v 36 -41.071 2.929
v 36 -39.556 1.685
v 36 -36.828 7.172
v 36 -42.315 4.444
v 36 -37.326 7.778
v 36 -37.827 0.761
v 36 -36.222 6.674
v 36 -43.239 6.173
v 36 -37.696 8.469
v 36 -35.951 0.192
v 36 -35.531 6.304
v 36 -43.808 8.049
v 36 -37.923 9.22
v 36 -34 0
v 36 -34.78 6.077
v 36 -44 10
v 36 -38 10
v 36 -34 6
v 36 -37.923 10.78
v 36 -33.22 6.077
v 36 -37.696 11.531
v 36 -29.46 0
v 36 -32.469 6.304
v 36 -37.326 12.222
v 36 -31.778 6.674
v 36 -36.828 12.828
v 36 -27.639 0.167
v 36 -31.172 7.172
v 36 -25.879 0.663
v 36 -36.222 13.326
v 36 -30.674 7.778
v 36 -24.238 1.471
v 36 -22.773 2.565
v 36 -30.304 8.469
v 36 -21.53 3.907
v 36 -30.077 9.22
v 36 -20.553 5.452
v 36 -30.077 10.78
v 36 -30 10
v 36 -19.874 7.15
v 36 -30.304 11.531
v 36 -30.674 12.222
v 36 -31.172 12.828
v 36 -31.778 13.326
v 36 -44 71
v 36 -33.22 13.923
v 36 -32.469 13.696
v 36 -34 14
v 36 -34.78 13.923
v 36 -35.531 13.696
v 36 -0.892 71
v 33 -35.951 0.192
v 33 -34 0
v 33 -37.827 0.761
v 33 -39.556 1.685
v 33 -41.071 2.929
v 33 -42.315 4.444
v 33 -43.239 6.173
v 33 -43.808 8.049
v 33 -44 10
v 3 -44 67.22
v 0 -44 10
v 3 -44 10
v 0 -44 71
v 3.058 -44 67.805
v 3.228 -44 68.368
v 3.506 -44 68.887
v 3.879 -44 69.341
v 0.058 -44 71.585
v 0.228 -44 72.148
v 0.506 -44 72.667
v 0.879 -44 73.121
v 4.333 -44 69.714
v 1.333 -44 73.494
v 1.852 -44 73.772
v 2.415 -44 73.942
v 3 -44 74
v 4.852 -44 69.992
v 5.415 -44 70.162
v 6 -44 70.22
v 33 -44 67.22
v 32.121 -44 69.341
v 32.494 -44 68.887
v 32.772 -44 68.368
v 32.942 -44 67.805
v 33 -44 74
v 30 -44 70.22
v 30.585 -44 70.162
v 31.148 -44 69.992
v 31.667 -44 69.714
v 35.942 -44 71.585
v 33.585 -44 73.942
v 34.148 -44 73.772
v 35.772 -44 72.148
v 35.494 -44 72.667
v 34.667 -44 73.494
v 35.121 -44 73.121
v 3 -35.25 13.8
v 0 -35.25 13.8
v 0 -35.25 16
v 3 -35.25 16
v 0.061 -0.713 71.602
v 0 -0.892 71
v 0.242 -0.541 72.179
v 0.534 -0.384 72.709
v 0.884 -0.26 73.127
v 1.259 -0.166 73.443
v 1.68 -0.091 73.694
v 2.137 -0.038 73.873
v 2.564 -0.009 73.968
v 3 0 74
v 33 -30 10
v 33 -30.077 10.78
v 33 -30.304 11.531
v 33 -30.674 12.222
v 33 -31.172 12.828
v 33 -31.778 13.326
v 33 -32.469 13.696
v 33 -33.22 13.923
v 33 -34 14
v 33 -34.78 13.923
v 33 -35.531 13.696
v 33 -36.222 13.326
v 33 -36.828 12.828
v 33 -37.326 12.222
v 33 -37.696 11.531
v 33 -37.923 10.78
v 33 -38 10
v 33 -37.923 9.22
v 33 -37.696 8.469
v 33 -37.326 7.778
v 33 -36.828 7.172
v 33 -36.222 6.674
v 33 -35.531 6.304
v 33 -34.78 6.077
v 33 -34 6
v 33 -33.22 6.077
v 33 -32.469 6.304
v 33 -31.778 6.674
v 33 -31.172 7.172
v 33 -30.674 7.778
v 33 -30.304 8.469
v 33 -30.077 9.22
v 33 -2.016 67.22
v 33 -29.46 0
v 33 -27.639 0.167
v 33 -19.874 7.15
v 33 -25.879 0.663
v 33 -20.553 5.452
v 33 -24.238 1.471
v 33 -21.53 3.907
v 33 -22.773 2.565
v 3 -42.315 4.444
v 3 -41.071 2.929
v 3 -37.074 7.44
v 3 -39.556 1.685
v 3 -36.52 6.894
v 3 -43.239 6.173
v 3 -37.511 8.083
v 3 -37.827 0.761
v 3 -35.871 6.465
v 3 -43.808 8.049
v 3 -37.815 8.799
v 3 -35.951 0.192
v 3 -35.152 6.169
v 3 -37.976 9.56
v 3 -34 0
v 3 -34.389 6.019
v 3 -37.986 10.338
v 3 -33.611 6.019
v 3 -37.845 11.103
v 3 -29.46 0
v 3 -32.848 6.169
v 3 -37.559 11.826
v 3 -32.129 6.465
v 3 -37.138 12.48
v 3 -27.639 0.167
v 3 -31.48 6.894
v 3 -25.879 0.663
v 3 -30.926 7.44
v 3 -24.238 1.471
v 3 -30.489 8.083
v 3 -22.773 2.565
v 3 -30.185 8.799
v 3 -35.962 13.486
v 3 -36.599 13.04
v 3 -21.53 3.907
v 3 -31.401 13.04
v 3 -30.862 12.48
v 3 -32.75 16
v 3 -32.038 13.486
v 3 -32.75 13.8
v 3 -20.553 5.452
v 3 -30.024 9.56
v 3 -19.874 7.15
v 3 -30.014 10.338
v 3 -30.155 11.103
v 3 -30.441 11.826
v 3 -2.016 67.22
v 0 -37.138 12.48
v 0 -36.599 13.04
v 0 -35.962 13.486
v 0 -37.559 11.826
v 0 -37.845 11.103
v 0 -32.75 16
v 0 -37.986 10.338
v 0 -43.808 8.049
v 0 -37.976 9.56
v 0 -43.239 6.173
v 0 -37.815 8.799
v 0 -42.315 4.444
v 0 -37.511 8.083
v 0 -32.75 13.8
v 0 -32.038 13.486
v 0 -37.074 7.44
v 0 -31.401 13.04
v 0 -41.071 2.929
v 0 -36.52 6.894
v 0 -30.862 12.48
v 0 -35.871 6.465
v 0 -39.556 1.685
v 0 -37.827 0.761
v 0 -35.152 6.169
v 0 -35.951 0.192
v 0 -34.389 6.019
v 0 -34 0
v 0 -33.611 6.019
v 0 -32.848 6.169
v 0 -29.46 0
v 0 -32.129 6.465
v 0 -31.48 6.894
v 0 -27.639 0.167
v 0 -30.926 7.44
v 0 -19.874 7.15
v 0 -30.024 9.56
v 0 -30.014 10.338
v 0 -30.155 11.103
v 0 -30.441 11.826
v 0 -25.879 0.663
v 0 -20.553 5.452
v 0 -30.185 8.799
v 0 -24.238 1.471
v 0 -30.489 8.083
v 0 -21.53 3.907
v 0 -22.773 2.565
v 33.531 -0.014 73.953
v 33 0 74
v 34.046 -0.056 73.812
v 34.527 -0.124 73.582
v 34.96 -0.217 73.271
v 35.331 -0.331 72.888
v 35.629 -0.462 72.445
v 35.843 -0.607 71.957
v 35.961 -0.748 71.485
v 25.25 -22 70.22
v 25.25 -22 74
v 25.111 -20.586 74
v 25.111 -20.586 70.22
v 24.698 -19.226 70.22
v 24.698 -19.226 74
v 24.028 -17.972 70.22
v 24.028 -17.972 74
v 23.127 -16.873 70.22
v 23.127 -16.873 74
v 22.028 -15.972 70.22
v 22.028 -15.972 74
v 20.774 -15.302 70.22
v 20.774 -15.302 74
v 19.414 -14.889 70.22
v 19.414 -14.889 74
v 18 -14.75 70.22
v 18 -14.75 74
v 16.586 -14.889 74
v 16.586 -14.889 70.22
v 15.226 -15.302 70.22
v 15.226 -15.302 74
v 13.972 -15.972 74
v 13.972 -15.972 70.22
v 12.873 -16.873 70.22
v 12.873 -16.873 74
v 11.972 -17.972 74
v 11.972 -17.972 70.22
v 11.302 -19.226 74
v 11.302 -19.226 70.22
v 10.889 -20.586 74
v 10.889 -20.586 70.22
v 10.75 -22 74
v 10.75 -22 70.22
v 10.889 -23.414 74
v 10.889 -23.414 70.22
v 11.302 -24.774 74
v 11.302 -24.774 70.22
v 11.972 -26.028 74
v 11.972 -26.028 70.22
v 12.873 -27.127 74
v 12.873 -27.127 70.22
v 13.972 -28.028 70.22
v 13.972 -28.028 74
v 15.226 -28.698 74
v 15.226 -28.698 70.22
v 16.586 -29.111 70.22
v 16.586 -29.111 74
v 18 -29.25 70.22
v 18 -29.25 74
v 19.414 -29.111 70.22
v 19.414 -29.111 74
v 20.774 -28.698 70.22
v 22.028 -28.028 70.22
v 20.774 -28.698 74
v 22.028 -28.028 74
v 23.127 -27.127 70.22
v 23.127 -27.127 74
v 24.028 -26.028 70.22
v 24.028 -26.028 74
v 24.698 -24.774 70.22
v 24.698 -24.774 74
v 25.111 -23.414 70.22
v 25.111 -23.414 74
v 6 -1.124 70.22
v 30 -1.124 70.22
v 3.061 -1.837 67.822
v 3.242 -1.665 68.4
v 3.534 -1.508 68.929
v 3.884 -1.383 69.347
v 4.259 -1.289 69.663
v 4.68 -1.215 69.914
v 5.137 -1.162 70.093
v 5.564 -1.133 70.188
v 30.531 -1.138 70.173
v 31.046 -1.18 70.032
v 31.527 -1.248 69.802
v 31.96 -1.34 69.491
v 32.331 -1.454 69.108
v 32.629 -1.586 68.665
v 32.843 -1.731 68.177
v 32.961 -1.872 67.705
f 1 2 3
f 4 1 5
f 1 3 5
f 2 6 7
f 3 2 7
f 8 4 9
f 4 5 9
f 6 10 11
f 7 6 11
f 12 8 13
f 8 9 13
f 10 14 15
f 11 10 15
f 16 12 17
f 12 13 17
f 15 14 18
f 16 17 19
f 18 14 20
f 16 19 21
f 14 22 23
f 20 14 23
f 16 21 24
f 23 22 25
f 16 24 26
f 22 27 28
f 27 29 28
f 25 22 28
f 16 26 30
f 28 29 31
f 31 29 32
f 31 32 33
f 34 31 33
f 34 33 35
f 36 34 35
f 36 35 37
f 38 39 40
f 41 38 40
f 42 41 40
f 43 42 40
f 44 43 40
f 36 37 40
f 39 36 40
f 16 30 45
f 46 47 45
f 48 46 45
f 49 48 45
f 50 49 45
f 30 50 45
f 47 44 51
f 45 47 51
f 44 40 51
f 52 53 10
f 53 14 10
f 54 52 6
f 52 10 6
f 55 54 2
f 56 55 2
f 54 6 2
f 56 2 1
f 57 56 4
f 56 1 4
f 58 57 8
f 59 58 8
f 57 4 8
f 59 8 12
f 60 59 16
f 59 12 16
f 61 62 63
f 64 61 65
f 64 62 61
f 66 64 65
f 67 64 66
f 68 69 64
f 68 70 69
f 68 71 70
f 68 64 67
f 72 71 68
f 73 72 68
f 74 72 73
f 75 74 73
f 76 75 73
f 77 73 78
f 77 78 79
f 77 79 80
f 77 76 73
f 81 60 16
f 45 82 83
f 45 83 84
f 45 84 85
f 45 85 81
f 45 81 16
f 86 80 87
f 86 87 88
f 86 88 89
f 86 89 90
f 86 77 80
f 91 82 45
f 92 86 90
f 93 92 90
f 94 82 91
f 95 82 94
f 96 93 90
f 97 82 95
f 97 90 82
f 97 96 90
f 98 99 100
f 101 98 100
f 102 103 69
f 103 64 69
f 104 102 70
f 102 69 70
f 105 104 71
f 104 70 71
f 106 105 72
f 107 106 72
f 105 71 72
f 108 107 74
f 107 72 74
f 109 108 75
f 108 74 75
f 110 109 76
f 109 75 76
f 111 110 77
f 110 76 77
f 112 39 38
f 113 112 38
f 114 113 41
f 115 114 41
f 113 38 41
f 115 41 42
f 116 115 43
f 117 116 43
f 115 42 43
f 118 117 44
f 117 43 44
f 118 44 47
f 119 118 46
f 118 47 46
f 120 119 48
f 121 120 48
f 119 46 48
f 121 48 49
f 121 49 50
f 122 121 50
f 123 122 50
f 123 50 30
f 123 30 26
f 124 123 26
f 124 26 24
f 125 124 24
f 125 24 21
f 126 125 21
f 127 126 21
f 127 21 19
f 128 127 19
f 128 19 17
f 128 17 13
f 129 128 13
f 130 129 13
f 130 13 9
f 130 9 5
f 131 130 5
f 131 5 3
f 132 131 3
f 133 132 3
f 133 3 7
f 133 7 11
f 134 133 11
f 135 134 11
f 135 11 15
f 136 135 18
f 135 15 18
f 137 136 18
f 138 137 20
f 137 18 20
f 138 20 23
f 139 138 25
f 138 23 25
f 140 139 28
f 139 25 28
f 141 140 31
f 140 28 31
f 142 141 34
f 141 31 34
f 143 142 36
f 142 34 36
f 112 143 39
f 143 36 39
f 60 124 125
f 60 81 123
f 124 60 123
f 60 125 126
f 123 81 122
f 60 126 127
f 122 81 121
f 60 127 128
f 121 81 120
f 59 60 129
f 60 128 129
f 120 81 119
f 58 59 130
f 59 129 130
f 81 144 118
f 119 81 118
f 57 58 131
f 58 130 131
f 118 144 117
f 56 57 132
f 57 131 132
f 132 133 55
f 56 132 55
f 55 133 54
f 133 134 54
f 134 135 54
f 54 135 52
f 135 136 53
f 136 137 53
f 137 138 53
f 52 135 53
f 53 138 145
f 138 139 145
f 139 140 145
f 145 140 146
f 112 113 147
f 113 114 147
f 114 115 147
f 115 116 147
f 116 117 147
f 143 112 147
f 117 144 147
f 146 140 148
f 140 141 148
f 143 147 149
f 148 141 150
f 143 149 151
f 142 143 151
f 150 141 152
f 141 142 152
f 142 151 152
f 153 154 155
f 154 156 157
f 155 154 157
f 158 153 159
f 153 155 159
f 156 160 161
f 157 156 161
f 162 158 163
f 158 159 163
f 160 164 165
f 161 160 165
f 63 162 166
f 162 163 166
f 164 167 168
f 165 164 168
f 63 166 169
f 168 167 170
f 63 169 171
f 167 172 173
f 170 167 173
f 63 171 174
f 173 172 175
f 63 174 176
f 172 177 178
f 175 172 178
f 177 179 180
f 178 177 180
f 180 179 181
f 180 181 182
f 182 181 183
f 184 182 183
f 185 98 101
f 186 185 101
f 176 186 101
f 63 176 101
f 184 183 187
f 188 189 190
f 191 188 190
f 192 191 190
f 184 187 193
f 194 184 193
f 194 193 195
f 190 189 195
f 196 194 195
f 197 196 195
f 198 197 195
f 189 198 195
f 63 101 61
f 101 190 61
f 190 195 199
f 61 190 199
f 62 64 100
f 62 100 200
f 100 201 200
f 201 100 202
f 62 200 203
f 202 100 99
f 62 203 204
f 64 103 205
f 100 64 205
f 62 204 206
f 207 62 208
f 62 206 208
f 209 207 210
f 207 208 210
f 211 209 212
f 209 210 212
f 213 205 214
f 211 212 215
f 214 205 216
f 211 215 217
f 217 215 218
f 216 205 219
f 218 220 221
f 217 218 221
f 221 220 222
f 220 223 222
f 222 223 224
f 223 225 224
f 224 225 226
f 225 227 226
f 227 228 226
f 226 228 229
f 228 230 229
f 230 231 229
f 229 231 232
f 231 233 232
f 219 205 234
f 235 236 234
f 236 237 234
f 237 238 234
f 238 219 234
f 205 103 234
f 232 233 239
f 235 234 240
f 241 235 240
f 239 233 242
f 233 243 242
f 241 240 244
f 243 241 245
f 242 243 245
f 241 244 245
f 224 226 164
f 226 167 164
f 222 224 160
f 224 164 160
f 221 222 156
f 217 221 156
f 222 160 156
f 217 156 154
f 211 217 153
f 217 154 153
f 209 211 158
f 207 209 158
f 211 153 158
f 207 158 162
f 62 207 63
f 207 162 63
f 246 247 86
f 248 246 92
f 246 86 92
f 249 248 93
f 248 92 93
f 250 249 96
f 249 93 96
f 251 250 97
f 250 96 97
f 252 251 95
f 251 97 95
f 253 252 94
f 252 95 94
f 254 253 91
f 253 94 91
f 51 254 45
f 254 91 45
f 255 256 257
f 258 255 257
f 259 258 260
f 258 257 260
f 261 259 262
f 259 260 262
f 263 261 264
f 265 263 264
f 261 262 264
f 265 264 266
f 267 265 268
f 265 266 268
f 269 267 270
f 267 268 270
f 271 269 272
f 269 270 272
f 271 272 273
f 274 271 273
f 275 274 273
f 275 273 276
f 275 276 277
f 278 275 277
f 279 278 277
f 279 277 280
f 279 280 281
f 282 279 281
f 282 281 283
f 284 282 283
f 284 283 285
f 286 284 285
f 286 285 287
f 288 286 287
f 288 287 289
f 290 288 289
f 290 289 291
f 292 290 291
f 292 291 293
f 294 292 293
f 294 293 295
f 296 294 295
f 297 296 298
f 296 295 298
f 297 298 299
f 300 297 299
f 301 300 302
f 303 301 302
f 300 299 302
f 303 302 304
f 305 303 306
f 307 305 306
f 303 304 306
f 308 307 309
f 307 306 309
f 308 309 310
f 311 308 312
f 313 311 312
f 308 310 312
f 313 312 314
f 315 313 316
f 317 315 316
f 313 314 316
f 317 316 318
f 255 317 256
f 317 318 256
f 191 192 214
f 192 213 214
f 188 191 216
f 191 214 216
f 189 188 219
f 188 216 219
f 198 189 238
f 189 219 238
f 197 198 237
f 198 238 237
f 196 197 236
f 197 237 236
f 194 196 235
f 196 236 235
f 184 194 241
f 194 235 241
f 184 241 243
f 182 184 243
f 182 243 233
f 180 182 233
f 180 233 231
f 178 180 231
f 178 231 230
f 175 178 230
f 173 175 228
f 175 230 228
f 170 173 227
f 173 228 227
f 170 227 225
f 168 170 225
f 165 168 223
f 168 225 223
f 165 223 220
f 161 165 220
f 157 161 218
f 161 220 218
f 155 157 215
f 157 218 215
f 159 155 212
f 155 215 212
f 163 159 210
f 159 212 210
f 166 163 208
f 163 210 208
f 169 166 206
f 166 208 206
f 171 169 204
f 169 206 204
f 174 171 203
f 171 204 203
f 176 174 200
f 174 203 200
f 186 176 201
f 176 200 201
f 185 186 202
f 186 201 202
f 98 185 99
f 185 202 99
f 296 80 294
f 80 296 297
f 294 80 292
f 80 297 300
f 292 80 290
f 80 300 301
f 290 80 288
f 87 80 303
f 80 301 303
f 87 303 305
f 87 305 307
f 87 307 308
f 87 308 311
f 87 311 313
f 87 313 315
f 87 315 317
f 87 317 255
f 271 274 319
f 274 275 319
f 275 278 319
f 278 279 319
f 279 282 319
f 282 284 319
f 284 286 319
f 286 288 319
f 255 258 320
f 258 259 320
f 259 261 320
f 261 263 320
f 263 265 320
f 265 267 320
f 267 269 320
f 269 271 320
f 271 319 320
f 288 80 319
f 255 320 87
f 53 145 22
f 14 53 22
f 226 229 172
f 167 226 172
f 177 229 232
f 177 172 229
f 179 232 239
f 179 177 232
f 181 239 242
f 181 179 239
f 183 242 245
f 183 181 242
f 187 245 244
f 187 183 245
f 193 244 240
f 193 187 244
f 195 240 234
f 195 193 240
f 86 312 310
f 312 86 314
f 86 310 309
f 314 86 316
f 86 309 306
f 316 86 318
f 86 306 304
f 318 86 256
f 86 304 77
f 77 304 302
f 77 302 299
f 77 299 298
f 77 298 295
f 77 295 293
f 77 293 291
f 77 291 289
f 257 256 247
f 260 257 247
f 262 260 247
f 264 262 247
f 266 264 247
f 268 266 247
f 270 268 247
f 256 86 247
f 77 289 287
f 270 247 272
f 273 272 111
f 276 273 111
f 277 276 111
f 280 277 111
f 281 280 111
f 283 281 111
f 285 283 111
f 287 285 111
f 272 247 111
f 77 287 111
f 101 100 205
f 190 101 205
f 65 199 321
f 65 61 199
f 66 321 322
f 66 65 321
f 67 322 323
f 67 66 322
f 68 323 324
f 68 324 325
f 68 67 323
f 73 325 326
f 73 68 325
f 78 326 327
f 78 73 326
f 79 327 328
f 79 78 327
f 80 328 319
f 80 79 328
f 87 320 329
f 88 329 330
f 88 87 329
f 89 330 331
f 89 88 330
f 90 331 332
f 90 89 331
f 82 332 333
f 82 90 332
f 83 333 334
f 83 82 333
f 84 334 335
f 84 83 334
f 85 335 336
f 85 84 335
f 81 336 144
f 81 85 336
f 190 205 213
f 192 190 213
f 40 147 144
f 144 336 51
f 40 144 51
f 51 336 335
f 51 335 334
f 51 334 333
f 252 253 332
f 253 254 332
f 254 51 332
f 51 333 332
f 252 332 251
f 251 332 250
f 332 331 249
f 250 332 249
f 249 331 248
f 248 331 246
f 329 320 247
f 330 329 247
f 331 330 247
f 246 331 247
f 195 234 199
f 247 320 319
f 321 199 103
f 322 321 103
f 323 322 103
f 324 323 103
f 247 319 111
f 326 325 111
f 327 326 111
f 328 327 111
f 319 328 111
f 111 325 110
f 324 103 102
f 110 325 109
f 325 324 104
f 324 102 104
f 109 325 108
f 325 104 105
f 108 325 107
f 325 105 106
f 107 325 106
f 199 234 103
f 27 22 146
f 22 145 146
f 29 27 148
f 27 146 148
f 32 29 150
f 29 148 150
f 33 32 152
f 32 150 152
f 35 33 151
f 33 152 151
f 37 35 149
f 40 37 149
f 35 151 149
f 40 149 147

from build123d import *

# Parameters (mm, degrees)
F1_DEPTH  = 44
F2_R      = 4
F3_DEPTH  = 25
F4_DEPTH  = 25
F6_DEPTH  = 25
F5_R      = 4
F7_DEPTH  = 25
F8_R      = 3
F10_DEPTH = 25
F11_R     = 10
F12_R     = 7.25
F13_DEPTH = 25


with BuildPart() as f1:
    # F0 (on Front) → F1 (new body)
    with BuildSketch(Plane.XZ):
        Polygon((0, 74), (0, 0), (3, 0), (3, 70.2200388411), (33, 70.2200388411), (33, 0), (36, 0), (36, 74), align=None)
    extrude(amount=F1_DEPTH)

    # F2 (on face) → F3 (cut)
    with BuildSketch(Plane.YZ.offset(36)):
        with Locations((-34, 10)):
            Circle(F2_R)
    extrude(amount=-F3_DEPTH, mode=Mode.SUBTRACT)

    # F2 (on face) → F4 (cut)
    with BuildSketch(Plane.YZ.offset(36)):
        Polygon((0, 74), (-22, 0), (0, 0), align=None)
    extrude(amount=-F4_DEPTH, mode=Mode.SUBTRACT)

    # F5 (on face) → F6 (cut)
    with BuildSketch(Plane(origin=(0, 0, 0), x_dir=(0, -1, 0), z_dir=(-1, 0, 0))):
        Polygon((22, 0), (0, 74), (0, 0), align=None)
    extrude(amount=-F6_DEPTH, mode=Mode.SUBTRACT)

    # F5 (on face) → F7 (cut)
    with BuildSketch(Plane(origin=(0, 0, 0), x_dir=(0, -1, 0), z_dir=(-1, 0, 0))):
        with Locations((34, 10)):
            Circle(F5_R)
    extrude(amount=-F7_DEPTH, mode=Mode.SUBTRACT)

    # F8
    f8_edges = [f1.edges().sort_by_distance(p)[0] for p in [
        (36, -22, 74),
        (0, -22, 74),
        (33, -22.561886, 70.220039),
        (3, -22.561886, 70.220039),
    ]]
    fillet(f8_edges, radius=F8_R)

    # F9 (on face) → F10 (cut)
    with BuildSketch(Plane(origin=(0, 0, 0), x_dir=(0, -1, 0), z_dir=(-1, 0, 0))):
        with BuildLine():
            Line((32.75, 16), (32.75, 13.7996710384))
            ThreePointArc((32.75, 13.7996710384), (34, 14), (35.25, 13.7996710384))
            Line((35.25, 13.7996710384), (35.25, 16))
            Line((35.25, 16), (32.75, 16))
        make_face()
    extrude(amount=-F10_DEPTH, mode=Mode.SUBTRACT)

    # F11
    f11_edges = [f1.edges().sort_by_distance(p)[0] for p in [
        (1.5, -22, 0),
        (1.5, -44, 0),
        (34.5, -44, 0),
        (34.5, -22, 0),
    ]]
    fillet(f11_edges, radius=F11_R)

    # F12 (on face) → F13 (cut)
    with BuildSketch(Plane.XY.offset(74)):
        with Locations((18, -22)):
            Circle(F12_R)
    extrude(amount=-F13_DEPTH, mode=Mode.SUBTRACT)


solid = f1.part
